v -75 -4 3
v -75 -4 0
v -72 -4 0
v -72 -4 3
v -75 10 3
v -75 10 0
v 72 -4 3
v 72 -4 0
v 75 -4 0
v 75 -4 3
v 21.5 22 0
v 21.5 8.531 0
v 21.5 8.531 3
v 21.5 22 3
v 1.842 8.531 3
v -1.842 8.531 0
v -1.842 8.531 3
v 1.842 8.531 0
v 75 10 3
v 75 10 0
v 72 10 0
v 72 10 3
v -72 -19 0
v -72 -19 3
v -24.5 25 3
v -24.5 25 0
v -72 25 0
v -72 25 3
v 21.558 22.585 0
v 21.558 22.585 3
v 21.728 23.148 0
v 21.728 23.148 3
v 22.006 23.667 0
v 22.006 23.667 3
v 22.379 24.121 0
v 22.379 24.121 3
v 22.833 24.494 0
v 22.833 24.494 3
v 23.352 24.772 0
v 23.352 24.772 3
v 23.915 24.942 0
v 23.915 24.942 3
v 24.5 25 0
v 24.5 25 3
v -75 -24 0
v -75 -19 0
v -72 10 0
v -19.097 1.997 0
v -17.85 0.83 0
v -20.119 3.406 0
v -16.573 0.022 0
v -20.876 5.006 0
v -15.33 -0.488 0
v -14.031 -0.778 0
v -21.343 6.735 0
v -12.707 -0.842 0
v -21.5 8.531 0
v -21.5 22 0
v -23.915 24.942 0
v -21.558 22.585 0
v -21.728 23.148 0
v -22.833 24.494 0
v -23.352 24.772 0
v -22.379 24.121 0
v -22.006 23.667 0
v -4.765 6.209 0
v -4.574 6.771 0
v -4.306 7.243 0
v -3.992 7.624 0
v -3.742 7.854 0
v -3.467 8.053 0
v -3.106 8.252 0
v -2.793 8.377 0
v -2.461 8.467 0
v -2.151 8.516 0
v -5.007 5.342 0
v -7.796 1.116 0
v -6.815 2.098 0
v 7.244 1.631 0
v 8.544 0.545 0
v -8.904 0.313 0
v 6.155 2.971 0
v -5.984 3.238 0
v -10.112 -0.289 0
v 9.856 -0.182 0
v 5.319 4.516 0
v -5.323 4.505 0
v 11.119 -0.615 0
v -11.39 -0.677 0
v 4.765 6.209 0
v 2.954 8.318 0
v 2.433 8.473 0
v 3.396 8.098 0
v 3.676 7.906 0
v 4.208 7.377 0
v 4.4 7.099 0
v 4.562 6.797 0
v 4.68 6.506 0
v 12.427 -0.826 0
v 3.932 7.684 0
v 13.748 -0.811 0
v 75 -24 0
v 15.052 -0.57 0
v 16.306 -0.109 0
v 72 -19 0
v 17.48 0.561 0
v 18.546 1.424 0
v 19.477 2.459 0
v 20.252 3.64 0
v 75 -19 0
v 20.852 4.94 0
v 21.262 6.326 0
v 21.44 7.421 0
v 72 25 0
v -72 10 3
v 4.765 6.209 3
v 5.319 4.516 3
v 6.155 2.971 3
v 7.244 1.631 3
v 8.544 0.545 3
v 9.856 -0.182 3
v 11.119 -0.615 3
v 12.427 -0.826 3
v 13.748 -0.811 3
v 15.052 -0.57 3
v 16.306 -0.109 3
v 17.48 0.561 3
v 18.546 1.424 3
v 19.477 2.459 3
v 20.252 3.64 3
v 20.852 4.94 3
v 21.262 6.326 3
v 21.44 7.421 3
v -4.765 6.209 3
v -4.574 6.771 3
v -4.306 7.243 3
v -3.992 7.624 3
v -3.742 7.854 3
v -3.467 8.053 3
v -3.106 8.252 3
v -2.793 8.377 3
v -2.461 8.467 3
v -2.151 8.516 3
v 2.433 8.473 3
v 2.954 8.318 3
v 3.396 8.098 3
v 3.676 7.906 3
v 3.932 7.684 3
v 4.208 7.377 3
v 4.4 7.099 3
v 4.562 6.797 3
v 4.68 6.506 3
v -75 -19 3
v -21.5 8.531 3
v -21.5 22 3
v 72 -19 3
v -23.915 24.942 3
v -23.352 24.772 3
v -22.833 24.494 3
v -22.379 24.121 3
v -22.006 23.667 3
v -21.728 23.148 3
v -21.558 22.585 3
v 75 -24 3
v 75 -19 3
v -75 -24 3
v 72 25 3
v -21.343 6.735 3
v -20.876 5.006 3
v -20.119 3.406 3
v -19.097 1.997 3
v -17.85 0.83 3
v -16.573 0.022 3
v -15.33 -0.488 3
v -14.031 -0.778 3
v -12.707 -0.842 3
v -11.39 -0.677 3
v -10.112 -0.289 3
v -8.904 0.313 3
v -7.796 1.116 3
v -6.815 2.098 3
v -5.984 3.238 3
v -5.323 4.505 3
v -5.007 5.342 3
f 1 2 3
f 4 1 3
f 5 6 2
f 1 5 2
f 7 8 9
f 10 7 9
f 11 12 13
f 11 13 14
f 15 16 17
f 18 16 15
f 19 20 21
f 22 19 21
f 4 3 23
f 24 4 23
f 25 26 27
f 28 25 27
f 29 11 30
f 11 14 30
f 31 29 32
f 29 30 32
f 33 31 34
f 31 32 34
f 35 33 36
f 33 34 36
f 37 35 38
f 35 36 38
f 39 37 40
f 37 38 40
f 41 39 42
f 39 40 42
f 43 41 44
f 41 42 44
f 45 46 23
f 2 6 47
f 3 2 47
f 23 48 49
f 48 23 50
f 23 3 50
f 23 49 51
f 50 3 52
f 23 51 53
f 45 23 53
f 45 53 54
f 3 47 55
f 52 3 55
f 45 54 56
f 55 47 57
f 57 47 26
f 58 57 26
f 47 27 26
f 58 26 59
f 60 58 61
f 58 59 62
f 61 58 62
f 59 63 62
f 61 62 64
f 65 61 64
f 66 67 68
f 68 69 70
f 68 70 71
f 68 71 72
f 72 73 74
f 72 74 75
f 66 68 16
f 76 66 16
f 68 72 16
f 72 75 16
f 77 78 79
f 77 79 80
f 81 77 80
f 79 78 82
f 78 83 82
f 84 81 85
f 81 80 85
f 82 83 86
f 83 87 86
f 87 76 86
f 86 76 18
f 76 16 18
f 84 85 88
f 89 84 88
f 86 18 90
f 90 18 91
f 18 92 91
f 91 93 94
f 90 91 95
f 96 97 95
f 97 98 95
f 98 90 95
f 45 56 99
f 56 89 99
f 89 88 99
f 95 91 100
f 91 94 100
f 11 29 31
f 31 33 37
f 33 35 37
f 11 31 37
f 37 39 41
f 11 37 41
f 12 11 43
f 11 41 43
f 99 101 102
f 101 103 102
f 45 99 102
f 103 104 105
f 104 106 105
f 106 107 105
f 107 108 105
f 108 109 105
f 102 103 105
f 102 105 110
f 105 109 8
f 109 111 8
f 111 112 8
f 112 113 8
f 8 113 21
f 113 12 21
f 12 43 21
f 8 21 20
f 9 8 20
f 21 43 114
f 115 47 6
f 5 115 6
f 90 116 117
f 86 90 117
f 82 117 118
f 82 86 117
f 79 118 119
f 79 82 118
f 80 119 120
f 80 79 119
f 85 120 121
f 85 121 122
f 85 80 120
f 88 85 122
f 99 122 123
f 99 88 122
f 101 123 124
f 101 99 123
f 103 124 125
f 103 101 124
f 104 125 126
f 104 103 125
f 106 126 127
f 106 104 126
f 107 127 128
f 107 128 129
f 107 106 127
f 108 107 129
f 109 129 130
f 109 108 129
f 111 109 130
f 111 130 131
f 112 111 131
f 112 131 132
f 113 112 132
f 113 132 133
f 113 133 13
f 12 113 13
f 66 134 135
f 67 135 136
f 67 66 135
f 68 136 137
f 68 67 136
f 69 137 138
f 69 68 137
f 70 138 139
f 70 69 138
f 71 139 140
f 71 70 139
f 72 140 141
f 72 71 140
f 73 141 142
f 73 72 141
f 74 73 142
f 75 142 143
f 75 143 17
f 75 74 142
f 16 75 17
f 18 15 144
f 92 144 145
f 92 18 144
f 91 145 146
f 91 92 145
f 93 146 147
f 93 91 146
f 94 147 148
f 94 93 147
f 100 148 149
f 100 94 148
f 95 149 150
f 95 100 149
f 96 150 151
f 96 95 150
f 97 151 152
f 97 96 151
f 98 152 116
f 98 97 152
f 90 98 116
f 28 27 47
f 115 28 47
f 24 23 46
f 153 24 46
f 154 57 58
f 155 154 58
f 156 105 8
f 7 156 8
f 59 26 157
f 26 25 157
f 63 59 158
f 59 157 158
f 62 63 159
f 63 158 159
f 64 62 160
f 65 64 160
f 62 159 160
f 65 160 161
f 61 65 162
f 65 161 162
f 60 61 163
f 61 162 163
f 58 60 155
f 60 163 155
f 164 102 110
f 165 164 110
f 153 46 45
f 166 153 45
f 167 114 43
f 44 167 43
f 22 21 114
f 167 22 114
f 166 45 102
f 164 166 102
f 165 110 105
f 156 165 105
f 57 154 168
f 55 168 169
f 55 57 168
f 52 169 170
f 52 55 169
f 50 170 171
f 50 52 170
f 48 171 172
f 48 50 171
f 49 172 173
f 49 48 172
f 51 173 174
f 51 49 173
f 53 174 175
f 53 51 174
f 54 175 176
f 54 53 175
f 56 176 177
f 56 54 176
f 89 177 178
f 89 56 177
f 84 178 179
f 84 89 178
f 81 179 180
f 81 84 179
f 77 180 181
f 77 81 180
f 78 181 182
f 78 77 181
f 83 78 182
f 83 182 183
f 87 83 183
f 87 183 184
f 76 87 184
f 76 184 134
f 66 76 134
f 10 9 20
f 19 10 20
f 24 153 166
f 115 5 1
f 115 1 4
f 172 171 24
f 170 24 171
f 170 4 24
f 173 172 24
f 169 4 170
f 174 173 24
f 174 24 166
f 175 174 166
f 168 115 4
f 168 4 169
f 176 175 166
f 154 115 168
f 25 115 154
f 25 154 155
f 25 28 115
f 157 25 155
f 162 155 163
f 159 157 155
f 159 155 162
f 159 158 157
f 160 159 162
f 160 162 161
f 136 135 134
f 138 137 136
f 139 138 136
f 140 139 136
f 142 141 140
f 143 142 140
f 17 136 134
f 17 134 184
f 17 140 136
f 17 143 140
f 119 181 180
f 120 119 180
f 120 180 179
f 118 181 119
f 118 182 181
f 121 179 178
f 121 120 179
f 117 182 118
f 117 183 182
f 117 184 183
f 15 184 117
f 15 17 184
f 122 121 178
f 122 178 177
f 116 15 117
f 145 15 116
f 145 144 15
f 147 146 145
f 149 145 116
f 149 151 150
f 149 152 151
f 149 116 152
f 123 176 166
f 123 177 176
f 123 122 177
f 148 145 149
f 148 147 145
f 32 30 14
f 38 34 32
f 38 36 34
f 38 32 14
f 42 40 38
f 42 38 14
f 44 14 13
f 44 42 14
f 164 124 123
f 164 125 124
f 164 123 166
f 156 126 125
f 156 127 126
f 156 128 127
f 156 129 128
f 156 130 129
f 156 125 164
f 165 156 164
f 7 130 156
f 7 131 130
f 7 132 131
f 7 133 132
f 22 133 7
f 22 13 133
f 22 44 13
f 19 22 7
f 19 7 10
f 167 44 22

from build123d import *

# Parameters (mm, degrees)
SALIENTE_EXTRUIR1_DEPTH = 3
CROQUIS2_R              = 8.5
CORTAR_EXTRUIR1_DEPTH   = 81.972978651
CROQUIS3_RX             = 9.378712311
CROQUIS3_RY             = 8.5
CORTAR_EXTRUIR2_DEPTH   = 3
CROQUIS4_W              = 43
CROQUIS4_H              = 16.468521704
CORTAR_EXTRUIR3_DEPTH   = 80.113842029
REDONDEO1_R             = 3
CROQUIS5_W              = 150
CROQUIS5_H              = 1
CORTAR_EXTRUIR4_DEPTH   = 80.113842155


with BuildPart() as part:
    # Croquis1 → Saliente-Extruir1 (new body)
    with BuildSketch(Plane.XY):
        Polygon((-75, -19), (-75, -25), (75, -25), (75, -19), (72, -19), (72, -4), (75, -4), (75, 10), (72, 10), (72, 25), (-72, 25), (-72, 10), (-75, 10), (-75, -4), (-72, -4), (-72, -19), align=None)
    extrude(amount=SALIENTE_EXTRUIR1_DEPTH)

    # Croquis2 → Cortar-Extruir1 (cut, through all)
    with BuildSketch(Plane(origin=(0, 2.342305324, -10.565456544), x_dir=(1, 0, 0), z_dir=(0, -0.4226182617407, 0.9063077870366497))):
        with Locations(Location((-13, 11.342305324, 0), (0, 0, 90))):
            Circle(CROQUIS2_R)
        with Locations(Location((13, 11.342305324, 0), (0, 0, 90))):
            Circle(CROQUIS2_R)
    extrude(amount=CORTAR_EXTRUIR1_DEPTH, mode=Mode.SUBTRACT)

    # Croquis3 → Cortar-Extruir2 (cut)
    with BuildSketch(Plane.XY):
        with Locations(Location((-13, 8.531478296), (0, 0, 90))):
            Ellipse(CROQUIS3_RX, CROQUIS3_RY)
        with Locations(Location((-13, 9.930401271), (0, 0, 90))):
            Ellipse(CROQUIS3_RX, CROQUIS3_RY)
        with Locations(Location((-13, 9.930401271), (0, 0, 90))):
            Ellipse(CROQUIS3_RX, CROQUIS3_RY)
        with Locations(Location((-13, 8.531478296), (0, 0, 90))):
            Ellipse(CROQUIS3_RX, CROQUIS3_RY)
        with Locations(Location((13, 9.930401271), (0, 0, 90))):
            Ellipse(CROQUIS3_RX, CROQUIS3_RY)
        with Locations(Location((13, 8.531478296), (0, 0, 90))):
            Ellipse(CROQUIS3_RX, CROQUIS3_RY)
        with Locations(Location((13, 8.531478296), (0, 0, 90))):
            Ellipse(CROQUIS3_RX, CROQUIS3_RY)
        with Locations(Location((13, 9.930401271), (0, 0, 90))):
            Ellipse(CROQUIS3_RX, CROQUIS3_RY)
        with Locations(Location((13, 8.531478296), (0, 0, 90))):
            Ellipse(CROQUIS3_RX, CROQUIS3_RY)
        with Locations(Location((13, 9.930401271), (0, 0, 90))):
            Ellipse(CROQUIS3_RX, CROQUIS3_RY)
        with Locations(Location((-13, 8.531478296), (0, 0, 90))):
            Ellipse(CROQUIS3_RX, CROQUIS3_RY)
        with Locations(Location((-13, 9.930401271), (0, 0, 90))):
            Ellipse(CROQUIS3_RX, CROQUIS3_RY)
    extrude(amount=CORTAR_EXTRUIR2_DEPTH, mode=Mode.SUBTRACT)

    # Croquis4 → Cortar-Extruir3 (cut, through all)
    with BuildSketch(Plane.XY):
        with Locations((0, 16.765739148)):
            Rectangle(CROQUIS4_W, CROQUIS4_H)
    extrude(amount=CORTAR_EXTRUIR3_DEPTH, mode=Mode.SUBTRACT)

    # Redondeo1
    redondeo1_edges = [part.edges().sort_by_distance(p)[0] for p in [
        (4.5, 8.531478296, 1.5000003),
        (-4.5, 8.531478296, 1.5000003),
        (21.5, 25, 1.5),
        (-21.5, 25, 1.5),
    ]]
    fillet(redondeo1_edges, radius=REDONDEO1_R)

    # Croquis5 → Cortar-Extruir4 (cut, through all)
    with BuildSketch(Plane.XY):
        with Locations((0, -24.5)):
            Rectangle(CROQUIS5_W, CROQUIS5_H)
    extrude(amount=CORTAR_EXTRUIR4_DEPTH, mode=Mode.SUBTRACT)


solid = part.part
